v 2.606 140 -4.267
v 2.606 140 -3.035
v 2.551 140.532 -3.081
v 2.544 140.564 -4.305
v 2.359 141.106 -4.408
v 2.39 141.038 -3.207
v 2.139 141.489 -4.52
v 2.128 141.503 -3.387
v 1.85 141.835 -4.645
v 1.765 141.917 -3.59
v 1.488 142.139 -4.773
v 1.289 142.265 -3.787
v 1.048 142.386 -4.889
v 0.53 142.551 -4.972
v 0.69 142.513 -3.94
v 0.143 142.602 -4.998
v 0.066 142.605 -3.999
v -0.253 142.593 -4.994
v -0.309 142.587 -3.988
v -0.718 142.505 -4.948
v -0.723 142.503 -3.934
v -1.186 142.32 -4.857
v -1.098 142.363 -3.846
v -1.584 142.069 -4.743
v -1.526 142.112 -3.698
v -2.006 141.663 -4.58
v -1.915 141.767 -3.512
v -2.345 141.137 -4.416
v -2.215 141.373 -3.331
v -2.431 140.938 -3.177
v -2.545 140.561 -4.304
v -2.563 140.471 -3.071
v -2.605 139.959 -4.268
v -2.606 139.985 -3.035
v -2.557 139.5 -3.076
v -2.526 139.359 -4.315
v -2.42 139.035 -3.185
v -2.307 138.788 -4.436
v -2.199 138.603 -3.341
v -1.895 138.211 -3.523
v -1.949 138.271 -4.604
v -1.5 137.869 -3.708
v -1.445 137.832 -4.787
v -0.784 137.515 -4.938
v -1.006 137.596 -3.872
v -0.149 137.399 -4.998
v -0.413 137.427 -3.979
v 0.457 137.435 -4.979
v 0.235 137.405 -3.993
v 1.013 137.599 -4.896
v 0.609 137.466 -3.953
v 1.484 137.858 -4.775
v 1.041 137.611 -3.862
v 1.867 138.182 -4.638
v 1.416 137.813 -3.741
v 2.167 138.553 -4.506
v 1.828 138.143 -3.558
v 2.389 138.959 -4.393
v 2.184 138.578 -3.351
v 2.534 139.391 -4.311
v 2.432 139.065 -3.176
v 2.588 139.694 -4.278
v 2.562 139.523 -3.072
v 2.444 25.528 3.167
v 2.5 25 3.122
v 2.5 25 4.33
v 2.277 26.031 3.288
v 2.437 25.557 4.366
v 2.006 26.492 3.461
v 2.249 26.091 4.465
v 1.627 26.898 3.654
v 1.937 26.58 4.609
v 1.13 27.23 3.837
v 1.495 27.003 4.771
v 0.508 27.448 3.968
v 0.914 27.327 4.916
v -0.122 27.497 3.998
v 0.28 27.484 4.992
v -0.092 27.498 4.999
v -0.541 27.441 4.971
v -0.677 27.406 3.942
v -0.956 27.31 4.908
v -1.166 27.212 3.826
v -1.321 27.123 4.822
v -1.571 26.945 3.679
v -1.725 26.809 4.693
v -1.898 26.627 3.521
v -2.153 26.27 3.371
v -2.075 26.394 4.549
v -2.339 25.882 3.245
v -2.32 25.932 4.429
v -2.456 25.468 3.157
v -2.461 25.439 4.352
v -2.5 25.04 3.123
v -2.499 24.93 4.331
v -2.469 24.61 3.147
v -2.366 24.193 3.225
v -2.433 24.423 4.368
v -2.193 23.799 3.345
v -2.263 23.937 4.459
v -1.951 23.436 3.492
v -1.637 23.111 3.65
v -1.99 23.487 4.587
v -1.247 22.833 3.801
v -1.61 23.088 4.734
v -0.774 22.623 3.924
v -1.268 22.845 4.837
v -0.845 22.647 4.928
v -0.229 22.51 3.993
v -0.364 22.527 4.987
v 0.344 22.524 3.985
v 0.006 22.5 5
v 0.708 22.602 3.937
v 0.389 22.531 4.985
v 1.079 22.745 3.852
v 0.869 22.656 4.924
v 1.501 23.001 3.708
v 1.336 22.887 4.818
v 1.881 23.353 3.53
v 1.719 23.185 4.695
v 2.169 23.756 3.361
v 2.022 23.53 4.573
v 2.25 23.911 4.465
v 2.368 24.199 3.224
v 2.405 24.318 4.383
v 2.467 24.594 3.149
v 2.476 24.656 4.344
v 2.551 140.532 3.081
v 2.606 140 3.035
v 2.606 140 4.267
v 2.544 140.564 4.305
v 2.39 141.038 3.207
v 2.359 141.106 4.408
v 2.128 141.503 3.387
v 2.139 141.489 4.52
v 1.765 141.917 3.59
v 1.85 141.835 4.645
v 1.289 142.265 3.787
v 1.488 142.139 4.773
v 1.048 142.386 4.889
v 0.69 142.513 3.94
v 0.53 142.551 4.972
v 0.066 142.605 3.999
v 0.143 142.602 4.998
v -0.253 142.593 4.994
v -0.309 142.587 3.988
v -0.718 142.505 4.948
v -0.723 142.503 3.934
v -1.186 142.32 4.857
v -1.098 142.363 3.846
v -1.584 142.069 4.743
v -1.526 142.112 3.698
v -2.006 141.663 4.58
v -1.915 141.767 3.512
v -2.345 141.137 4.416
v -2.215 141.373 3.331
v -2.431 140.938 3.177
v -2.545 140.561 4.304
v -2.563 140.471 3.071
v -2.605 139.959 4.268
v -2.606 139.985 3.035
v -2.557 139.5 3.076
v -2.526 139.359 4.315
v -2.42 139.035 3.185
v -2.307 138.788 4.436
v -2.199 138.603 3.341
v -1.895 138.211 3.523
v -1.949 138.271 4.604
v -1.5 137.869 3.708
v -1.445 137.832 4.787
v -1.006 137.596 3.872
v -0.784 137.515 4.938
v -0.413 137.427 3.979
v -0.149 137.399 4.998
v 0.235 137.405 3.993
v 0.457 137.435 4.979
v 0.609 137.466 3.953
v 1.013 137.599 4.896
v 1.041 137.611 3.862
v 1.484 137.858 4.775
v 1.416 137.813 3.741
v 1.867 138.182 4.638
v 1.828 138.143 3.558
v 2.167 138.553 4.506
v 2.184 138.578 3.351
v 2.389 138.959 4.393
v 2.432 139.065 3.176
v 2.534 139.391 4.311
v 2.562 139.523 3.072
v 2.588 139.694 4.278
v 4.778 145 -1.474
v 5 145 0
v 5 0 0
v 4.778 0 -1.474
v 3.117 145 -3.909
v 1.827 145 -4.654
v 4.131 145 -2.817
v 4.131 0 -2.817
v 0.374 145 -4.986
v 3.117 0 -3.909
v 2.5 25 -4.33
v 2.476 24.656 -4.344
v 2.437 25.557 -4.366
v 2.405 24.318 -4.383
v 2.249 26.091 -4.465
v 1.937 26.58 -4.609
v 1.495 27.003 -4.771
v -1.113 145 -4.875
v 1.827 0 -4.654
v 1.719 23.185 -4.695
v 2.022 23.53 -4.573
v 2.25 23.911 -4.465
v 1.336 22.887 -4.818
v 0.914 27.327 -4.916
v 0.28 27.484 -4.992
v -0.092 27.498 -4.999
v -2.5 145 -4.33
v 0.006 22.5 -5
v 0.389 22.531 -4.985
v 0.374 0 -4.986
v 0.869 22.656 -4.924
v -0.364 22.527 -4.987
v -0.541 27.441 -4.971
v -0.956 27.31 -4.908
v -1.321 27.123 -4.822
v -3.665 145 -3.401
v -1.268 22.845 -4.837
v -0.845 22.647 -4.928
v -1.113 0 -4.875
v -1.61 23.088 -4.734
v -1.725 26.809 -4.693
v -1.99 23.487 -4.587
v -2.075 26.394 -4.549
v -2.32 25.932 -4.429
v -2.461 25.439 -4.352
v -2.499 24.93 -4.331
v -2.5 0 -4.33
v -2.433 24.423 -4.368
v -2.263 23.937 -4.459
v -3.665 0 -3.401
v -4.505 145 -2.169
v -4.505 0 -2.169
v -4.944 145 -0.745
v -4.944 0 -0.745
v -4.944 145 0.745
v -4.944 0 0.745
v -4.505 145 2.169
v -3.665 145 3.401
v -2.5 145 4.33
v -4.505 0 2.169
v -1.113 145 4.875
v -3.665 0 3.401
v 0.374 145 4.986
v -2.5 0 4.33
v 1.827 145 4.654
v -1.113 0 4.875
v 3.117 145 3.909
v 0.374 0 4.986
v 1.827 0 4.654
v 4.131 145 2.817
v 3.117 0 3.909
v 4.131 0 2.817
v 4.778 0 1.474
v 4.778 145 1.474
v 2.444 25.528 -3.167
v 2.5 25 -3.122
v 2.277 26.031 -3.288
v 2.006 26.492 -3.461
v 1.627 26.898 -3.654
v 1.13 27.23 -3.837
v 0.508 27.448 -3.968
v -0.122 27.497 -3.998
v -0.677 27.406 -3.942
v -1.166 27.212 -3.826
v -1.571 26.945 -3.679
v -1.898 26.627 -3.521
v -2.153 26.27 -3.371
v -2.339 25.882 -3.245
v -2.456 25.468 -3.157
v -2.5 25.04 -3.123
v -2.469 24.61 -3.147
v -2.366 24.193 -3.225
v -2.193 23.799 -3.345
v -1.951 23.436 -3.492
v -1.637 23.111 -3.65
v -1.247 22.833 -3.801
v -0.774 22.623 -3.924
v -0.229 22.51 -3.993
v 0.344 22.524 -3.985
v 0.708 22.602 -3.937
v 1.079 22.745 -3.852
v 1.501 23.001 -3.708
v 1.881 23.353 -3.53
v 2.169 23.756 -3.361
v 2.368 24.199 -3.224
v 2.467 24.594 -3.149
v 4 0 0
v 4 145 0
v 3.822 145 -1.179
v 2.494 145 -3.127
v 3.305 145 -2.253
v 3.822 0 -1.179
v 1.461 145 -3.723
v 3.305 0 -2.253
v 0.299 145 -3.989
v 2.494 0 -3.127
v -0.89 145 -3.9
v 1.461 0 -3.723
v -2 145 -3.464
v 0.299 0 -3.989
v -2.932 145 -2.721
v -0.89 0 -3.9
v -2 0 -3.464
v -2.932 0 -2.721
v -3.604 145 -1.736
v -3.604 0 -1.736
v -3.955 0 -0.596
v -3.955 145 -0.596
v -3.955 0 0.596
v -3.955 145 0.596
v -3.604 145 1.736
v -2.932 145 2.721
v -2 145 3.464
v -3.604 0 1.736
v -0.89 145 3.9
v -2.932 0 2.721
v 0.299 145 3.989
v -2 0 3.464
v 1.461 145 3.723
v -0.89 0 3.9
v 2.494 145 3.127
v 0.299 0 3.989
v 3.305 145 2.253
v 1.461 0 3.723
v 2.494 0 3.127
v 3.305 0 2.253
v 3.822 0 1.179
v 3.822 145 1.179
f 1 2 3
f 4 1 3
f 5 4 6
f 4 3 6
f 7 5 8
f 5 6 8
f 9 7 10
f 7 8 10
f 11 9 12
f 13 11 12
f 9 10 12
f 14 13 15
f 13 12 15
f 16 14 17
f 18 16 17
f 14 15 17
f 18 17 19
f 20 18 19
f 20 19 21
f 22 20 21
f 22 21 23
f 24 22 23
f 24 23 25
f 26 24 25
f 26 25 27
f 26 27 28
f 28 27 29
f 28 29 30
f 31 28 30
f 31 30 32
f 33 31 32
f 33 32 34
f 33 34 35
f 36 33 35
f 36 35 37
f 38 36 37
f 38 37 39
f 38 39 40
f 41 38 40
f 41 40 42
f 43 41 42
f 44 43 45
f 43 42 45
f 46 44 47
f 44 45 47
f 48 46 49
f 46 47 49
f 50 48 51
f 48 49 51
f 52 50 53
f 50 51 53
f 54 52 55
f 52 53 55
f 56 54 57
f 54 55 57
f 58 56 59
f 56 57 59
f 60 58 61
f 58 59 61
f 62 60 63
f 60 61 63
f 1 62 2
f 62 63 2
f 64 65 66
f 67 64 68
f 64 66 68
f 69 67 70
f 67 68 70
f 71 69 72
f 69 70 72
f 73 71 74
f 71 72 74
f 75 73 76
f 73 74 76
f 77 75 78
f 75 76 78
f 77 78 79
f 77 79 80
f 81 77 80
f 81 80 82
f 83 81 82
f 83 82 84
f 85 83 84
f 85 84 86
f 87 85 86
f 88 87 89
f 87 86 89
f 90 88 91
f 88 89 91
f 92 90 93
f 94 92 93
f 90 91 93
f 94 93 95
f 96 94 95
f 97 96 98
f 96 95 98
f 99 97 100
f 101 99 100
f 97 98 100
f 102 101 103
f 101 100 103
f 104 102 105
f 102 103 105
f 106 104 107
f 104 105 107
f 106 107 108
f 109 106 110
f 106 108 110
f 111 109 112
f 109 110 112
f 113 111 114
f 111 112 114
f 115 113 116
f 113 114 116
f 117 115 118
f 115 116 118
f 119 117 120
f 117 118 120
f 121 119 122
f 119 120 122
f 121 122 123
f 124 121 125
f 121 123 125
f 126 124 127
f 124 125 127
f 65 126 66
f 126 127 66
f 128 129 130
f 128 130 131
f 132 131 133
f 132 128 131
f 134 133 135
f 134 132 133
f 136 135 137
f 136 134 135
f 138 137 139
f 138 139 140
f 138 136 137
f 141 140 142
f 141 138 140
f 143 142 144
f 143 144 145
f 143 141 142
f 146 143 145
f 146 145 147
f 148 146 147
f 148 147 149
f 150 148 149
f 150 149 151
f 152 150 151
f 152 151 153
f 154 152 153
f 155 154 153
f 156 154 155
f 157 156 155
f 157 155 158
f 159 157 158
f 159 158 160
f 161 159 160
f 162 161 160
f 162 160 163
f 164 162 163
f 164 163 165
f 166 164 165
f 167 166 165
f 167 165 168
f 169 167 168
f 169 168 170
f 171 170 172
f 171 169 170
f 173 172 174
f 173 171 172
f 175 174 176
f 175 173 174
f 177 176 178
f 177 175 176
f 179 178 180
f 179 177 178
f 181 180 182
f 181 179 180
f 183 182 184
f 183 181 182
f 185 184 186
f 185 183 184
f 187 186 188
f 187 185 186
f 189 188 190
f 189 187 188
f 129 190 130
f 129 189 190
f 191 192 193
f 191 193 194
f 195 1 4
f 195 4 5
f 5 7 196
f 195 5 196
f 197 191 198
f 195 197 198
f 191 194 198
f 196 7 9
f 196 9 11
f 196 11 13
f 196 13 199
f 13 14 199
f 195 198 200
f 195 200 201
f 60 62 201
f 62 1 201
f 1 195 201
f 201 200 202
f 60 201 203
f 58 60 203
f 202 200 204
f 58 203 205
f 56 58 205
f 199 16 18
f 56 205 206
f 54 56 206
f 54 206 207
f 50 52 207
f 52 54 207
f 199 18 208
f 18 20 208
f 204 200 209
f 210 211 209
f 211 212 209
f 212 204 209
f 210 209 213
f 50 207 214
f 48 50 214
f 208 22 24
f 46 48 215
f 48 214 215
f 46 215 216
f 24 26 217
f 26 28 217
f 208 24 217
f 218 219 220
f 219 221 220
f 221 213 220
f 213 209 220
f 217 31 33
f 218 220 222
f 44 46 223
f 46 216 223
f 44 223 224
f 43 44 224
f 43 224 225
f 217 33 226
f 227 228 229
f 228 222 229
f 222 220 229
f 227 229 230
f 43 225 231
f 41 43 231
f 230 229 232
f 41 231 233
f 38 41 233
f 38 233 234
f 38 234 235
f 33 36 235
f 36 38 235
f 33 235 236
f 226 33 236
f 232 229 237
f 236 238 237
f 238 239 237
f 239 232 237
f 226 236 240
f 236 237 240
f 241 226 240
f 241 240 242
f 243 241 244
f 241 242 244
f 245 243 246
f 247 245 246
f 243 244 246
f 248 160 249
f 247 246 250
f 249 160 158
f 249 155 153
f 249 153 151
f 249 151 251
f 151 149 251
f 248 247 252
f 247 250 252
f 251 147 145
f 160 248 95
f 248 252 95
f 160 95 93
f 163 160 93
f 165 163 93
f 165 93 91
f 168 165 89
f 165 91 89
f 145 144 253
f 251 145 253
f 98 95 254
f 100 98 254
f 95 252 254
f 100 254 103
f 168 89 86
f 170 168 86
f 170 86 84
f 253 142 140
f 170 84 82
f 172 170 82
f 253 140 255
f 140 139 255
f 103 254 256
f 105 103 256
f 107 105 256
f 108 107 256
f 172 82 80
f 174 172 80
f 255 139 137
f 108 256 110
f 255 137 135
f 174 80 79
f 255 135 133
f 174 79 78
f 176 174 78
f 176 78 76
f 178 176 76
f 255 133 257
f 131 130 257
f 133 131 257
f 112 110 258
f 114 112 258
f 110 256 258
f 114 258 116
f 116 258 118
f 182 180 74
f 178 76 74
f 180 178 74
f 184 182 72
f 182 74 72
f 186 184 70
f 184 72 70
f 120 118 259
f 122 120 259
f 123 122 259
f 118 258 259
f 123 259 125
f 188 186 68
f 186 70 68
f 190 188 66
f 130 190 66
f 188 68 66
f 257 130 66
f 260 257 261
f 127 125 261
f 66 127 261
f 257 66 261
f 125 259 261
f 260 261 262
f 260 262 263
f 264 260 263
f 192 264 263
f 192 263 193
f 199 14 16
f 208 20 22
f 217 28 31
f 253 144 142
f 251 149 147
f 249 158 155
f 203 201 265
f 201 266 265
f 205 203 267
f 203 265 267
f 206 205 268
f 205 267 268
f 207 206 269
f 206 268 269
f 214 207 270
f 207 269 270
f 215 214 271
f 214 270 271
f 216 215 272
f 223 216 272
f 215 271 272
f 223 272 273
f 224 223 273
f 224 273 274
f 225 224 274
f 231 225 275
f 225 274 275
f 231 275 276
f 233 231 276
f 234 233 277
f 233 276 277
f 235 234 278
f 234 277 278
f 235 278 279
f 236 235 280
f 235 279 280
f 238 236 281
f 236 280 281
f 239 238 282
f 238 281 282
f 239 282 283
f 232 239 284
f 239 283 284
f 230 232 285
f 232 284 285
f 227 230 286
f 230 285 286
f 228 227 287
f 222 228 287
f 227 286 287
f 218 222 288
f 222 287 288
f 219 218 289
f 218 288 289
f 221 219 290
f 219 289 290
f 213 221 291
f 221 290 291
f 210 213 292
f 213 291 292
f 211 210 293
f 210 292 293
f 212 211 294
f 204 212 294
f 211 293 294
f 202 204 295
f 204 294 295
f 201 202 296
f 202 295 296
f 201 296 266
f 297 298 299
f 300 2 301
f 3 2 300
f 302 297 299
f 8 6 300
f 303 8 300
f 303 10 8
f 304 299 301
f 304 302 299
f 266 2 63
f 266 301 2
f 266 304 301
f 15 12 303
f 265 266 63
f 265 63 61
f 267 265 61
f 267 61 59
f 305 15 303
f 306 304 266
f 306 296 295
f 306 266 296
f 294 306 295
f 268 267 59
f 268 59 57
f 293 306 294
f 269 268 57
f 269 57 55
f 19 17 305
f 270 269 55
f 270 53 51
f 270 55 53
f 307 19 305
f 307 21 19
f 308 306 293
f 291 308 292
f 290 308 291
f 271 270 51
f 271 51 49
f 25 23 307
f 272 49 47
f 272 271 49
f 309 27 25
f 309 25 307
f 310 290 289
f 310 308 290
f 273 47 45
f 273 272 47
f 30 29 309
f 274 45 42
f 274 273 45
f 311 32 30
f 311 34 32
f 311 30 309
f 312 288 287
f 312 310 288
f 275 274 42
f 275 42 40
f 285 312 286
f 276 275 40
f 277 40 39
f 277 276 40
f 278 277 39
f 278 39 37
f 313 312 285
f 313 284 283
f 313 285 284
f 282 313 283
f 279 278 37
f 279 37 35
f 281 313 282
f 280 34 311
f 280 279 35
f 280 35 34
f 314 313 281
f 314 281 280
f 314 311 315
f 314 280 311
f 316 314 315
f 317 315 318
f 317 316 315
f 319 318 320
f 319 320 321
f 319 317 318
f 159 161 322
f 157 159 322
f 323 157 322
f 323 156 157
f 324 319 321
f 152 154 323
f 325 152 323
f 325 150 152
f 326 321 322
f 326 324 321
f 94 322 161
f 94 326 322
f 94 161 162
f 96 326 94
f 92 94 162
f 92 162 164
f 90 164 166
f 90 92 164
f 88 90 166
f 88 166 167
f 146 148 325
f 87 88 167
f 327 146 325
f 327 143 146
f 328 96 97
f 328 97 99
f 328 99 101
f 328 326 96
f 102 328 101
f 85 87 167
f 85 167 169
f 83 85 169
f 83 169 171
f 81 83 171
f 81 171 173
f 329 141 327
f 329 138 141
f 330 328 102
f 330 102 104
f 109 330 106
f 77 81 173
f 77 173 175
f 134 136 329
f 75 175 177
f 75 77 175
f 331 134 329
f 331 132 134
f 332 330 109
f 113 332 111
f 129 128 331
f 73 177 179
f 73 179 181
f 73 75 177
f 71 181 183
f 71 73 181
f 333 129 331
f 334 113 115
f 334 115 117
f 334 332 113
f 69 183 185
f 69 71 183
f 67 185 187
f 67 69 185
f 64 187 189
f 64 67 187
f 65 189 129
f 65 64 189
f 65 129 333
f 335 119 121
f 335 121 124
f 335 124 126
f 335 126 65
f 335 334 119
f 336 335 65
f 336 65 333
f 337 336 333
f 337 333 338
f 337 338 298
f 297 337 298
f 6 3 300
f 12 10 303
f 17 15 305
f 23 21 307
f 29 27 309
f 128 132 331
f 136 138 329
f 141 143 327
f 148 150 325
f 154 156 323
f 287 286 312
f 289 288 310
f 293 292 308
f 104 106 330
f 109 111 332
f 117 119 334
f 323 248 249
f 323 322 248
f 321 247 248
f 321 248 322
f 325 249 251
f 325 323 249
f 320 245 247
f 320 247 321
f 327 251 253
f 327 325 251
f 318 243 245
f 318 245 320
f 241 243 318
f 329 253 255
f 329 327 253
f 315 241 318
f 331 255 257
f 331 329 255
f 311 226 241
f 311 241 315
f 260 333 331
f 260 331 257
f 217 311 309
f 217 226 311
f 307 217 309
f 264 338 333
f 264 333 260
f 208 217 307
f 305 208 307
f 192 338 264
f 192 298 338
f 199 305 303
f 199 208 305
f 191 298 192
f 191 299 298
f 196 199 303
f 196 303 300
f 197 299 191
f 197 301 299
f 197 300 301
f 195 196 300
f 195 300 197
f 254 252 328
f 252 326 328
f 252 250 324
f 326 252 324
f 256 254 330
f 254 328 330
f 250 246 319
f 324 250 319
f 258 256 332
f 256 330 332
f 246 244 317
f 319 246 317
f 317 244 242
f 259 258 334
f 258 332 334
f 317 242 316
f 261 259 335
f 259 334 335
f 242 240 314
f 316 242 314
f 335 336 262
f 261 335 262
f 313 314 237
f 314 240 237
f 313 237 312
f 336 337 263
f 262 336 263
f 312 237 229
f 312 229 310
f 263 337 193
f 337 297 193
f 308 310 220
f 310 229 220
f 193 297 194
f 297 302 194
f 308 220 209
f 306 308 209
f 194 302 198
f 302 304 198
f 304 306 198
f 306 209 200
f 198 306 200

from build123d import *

# Parameters (mm, degrees)
SZKIC1_R                    = 5
SZKIC1_R_2                  = 4
DODANIE_WYCI_GNI_CIE1_DEPTH = 145
SZKIC2_R                    = 2.605682129
SZKIC2_R_2                  = 2.5
WYTNIJ_WYCI_GNI_CIE1_DEPTH  = 15


with BuildPart() as part:
    # Szkic1 → Dodanie-wyciągnięcie1 (new body)
    with BuildSketch(Plane(origin=(0, 0, 0), x_dir=(1, 0, 0), z_dir=(0, 1, 0))):
        Circle(SZKIC1_R)
        Circle(SZKIC1_R_2, mode=Mode.SUBTRACT)
    extrude(amount=DODANIE_WYCI_GNI_CIE1_DEPTH)

    # Szkic2 → Wytnij-wyciągnięcie1 (cut, symmetric)
    with BuildSketch(Plane.XY):
        with Locations((0, 140)):
            Circle(SZKIC2_R)
        with Locations((1.33e-07, 25)):
            Circle(SZKIC2_R_2)
    extrude(amount=WYTNIJ_WYCI_GNI_CIE1_DEPTH, both=True, mode=Mode.SUBTRACT)


solid = part.part
